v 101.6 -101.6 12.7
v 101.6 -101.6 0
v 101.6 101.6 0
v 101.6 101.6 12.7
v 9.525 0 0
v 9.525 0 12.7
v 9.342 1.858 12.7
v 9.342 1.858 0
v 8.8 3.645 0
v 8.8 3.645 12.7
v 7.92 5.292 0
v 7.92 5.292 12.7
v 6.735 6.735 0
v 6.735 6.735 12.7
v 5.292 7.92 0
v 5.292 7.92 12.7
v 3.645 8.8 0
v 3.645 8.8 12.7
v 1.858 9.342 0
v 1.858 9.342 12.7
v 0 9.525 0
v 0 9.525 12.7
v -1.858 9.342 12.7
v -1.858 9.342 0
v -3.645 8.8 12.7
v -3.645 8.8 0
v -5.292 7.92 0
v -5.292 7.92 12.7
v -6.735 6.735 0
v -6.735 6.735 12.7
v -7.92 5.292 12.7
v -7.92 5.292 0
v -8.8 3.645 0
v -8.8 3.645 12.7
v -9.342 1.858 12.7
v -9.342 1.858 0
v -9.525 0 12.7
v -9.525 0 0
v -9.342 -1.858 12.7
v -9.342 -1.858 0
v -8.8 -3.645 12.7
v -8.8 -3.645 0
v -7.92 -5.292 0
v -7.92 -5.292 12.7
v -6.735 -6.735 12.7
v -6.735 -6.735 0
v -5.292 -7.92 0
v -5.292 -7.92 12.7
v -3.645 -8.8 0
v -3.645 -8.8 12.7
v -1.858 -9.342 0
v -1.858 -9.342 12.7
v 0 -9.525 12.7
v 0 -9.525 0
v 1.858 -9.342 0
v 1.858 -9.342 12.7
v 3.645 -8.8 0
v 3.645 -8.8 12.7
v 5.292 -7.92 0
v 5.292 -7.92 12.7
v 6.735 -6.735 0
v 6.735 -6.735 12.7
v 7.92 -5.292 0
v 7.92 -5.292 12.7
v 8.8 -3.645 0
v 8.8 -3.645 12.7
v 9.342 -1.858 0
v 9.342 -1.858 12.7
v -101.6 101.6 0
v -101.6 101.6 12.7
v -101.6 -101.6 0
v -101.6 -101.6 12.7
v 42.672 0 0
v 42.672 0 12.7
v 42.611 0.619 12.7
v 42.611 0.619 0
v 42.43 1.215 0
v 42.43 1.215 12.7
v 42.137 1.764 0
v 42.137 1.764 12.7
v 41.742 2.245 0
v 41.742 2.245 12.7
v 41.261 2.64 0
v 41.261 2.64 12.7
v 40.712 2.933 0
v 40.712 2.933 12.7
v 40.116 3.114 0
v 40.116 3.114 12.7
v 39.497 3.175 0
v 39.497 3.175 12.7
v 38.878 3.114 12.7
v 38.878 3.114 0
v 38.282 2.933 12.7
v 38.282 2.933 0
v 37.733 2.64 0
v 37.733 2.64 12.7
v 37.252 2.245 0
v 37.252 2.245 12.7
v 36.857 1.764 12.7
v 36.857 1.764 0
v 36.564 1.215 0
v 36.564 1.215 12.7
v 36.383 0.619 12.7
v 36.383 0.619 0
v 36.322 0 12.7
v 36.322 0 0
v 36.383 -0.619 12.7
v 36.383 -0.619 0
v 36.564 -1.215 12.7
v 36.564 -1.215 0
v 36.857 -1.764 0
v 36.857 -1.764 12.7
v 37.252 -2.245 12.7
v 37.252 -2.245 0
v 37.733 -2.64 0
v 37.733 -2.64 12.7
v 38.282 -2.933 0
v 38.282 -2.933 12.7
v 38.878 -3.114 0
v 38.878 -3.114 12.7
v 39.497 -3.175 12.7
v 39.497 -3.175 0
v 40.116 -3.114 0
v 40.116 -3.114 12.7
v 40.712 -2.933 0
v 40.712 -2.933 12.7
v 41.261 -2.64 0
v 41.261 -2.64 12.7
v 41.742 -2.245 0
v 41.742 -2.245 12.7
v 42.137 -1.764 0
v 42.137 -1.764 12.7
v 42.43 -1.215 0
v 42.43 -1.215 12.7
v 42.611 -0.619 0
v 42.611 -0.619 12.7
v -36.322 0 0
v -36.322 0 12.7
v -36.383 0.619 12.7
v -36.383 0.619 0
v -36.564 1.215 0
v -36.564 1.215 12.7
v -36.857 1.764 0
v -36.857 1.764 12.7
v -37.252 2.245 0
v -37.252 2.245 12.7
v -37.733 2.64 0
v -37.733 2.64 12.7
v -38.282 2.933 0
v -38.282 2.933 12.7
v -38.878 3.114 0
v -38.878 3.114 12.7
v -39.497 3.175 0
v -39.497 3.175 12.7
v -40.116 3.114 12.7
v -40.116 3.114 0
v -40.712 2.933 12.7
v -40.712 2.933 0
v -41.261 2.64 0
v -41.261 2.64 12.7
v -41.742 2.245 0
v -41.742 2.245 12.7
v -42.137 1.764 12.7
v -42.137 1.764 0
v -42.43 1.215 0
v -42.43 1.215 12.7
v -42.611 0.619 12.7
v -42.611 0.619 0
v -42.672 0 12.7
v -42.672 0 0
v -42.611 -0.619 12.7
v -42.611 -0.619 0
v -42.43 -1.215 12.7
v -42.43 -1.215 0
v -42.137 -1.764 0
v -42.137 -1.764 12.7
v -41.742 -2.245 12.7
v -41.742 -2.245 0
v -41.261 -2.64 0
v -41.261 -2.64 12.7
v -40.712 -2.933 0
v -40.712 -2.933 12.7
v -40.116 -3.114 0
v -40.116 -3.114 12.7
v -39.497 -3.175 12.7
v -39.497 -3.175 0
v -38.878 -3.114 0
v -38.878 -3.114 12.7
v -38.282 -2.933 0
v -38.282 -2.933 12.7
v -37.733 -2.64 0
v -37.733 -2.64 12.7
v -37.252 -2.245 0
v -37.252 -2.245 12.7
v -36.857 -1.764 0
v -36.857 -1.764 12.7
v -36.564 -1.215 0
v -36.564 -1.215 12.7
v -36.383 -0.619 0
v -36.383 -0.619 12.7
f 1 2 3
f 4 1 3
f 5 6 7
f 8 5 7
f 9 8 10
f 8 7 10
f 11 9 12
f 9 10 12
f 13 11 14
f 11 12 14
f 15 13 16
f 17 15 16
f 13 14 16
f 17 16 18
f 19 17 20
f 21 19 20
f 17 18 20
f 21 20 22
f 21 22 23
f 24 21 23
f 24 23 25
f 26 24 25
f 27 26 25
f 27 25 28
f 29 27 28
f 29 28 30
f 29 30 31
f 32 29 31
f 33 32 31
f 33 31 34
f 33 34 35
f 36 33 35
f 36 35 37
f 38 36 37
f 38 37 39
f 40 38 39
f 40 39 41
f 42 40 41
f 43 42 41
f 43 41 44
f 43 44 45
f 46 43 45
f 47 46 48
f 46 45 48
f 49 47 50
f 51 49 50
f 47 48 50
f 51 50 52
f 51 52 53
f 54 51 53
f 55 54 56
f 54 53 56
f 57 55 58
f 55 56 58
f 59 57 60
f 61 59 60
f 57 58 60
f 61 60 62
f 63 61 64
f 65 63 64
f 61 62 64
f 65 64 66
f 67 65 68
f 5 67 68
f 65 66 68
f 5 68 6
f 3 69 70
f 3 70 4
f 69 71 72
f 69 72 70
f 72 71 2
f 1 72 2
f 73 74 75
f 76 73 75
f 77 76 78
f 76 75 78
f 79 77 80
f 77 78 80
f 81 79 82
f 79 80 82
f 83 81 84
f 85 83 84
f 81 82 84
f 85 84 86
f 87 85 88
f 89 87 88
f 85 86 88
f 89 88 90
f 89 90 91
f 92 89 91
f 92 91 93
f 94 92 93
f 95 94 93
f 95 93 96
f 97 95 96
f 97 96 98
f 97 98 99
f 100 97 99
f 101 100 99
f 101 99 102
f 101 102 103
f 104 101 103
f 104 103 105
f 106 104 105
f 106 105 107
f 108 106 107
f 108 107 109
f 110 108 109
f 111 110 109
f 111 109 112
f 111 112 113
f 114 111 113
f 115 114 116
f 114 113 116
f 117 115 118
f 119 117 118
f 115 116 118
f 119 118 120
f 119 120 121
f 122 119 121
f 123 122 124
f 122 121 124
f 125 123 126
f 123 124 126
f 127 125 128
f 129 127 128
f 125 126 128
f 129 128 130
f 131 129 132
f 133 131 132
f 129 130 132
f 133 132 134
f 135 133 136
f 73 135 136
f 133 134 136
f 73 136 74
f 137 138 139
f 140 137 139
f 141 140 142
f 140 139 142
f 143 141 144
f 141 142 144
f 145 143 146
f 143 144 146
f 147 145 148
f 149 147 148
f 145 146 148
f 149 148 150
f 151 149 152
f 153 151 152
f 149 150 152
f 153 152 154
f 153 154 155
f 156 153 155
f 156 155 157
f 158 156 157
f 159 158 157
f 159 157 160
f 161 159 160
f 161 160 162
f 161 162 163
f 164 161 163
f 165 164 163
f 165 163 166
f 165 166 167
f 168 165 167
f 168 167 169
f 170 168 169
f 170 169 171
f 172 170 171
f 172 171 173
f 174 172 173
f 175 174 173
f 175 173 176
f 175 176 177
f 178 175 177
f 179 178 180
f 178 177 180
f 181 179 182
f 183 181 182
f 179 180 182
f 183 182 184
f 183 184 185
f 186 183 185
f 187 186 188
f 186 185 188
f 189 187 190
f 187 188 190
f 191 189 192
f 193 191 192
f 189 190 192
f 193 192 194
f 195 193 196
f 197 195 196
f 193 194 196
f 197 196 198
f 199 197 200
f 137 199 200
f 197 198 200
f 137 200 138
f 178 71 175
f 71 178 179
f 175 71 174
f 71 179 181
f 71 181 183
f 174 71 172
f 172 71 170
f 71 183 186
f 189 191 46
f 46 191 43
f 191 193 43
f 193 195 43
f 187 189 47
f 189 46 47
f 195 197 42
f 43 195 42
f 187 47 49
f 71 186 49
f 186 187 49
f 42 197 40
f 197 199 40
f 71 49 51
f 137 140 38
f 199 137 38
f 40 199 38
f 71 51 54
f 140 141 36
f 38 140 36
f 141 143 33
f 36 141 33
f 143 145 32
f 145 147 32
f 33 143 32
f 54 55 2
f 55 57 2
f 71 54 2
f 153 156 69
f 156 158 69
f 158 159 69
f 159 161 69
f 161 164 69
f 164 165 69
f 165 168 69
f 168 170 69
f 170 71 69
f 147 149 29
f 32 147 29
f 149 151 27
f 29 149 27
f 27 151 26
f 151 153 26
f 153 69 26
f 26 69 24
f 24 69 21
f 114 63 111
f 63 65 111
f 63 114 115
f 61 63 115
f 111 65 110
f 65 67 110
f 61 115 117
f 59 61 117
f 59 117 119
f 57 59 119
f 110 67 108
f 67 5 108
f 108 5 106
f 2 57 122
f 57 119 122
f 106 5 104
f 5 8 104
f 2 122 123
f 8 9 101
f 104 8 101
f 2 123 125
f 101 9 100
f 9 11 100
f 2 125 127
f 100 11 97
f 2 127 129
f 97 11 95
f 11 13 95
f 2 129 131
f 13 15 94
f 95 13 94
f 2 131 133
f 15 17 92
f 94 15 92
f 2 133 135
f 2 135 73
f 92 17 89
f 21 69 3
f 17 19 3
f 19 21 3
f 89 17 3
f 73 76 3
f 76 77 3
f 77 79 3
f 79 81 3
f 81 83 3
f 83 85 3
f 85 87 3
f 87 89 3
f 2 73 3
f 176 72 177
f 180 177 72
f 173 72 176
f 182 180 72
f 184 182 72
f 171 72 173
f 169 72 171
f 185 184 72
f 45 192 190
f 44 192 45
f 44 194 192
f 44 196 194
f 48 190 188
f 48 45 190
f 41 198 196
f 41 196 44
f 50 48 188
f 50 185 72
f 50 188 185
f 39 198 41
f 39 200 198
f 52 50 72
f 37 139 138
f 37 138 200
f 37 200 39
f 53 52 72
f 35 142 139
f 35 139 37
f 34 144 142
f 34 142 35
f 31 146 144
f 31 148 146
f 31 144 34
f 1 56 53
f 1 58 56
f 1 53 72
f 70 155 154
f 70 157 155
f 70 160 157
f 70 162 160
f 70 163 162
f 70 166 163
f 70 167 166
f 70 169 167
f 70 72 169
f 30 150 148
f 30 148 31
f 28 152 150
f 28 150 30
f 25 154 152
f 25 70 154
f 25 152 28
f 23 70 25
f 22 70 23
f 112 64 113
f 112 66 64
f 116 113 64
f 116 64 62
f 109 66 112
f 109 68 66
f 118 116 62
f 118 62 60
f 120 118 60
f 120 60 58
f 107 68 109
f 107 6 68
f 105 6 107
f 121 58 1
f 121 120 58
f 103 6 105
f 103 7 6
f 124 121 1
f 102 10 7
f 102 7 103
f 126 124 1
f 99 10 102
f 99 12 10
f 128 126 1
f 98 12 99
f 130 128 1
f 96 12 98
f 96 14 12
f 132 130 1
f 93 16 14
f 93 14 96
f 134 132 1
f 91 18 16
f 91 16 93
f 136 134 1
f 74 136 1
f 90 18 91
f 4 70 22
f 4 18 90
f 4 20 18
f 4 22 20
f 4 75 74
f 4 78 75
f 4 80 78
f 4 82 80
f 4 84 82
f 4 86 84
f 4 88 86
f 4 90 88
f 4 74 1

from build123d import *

# Parameters (mm, degrees)
SKETCH1_W           = 203.2
SKETCH1_H           = 203.2
BOSS_EXTRUDE1_DEPTH = 12.7
SKETCH2_R           = 9.525
SKETCH2_R_2         = 3.175
CUT_EXTRUDE1_DEPTH  = 145.244271983


with BuildPart() as part:
    # Sketch1 → Boss-Extrude1 (new body)
    with BuildSketch(Plane.XY):
        Rectangle(SKETCH1_W, SKETCH1_H)
    extrude(amount=BOSS_EXTRUDE1_DEPTH)

    # Sketch2 → Cut-Extrude1 (cut, through all)
    with BuildSketch(Plane.XY.offset(12.7)):
        Circle(SKETCH2_R)
        with Locations((39.497, 0)):
            Circle(SKETCH2_R_2)
        with Locations((-39.497, 0)):
            Circle(SKETCH2_R_2)
    extrude(amount=-CUT_EXTRUDE1_DEPTH, mode=Mode.SUBTRACT)


solid = part.part
